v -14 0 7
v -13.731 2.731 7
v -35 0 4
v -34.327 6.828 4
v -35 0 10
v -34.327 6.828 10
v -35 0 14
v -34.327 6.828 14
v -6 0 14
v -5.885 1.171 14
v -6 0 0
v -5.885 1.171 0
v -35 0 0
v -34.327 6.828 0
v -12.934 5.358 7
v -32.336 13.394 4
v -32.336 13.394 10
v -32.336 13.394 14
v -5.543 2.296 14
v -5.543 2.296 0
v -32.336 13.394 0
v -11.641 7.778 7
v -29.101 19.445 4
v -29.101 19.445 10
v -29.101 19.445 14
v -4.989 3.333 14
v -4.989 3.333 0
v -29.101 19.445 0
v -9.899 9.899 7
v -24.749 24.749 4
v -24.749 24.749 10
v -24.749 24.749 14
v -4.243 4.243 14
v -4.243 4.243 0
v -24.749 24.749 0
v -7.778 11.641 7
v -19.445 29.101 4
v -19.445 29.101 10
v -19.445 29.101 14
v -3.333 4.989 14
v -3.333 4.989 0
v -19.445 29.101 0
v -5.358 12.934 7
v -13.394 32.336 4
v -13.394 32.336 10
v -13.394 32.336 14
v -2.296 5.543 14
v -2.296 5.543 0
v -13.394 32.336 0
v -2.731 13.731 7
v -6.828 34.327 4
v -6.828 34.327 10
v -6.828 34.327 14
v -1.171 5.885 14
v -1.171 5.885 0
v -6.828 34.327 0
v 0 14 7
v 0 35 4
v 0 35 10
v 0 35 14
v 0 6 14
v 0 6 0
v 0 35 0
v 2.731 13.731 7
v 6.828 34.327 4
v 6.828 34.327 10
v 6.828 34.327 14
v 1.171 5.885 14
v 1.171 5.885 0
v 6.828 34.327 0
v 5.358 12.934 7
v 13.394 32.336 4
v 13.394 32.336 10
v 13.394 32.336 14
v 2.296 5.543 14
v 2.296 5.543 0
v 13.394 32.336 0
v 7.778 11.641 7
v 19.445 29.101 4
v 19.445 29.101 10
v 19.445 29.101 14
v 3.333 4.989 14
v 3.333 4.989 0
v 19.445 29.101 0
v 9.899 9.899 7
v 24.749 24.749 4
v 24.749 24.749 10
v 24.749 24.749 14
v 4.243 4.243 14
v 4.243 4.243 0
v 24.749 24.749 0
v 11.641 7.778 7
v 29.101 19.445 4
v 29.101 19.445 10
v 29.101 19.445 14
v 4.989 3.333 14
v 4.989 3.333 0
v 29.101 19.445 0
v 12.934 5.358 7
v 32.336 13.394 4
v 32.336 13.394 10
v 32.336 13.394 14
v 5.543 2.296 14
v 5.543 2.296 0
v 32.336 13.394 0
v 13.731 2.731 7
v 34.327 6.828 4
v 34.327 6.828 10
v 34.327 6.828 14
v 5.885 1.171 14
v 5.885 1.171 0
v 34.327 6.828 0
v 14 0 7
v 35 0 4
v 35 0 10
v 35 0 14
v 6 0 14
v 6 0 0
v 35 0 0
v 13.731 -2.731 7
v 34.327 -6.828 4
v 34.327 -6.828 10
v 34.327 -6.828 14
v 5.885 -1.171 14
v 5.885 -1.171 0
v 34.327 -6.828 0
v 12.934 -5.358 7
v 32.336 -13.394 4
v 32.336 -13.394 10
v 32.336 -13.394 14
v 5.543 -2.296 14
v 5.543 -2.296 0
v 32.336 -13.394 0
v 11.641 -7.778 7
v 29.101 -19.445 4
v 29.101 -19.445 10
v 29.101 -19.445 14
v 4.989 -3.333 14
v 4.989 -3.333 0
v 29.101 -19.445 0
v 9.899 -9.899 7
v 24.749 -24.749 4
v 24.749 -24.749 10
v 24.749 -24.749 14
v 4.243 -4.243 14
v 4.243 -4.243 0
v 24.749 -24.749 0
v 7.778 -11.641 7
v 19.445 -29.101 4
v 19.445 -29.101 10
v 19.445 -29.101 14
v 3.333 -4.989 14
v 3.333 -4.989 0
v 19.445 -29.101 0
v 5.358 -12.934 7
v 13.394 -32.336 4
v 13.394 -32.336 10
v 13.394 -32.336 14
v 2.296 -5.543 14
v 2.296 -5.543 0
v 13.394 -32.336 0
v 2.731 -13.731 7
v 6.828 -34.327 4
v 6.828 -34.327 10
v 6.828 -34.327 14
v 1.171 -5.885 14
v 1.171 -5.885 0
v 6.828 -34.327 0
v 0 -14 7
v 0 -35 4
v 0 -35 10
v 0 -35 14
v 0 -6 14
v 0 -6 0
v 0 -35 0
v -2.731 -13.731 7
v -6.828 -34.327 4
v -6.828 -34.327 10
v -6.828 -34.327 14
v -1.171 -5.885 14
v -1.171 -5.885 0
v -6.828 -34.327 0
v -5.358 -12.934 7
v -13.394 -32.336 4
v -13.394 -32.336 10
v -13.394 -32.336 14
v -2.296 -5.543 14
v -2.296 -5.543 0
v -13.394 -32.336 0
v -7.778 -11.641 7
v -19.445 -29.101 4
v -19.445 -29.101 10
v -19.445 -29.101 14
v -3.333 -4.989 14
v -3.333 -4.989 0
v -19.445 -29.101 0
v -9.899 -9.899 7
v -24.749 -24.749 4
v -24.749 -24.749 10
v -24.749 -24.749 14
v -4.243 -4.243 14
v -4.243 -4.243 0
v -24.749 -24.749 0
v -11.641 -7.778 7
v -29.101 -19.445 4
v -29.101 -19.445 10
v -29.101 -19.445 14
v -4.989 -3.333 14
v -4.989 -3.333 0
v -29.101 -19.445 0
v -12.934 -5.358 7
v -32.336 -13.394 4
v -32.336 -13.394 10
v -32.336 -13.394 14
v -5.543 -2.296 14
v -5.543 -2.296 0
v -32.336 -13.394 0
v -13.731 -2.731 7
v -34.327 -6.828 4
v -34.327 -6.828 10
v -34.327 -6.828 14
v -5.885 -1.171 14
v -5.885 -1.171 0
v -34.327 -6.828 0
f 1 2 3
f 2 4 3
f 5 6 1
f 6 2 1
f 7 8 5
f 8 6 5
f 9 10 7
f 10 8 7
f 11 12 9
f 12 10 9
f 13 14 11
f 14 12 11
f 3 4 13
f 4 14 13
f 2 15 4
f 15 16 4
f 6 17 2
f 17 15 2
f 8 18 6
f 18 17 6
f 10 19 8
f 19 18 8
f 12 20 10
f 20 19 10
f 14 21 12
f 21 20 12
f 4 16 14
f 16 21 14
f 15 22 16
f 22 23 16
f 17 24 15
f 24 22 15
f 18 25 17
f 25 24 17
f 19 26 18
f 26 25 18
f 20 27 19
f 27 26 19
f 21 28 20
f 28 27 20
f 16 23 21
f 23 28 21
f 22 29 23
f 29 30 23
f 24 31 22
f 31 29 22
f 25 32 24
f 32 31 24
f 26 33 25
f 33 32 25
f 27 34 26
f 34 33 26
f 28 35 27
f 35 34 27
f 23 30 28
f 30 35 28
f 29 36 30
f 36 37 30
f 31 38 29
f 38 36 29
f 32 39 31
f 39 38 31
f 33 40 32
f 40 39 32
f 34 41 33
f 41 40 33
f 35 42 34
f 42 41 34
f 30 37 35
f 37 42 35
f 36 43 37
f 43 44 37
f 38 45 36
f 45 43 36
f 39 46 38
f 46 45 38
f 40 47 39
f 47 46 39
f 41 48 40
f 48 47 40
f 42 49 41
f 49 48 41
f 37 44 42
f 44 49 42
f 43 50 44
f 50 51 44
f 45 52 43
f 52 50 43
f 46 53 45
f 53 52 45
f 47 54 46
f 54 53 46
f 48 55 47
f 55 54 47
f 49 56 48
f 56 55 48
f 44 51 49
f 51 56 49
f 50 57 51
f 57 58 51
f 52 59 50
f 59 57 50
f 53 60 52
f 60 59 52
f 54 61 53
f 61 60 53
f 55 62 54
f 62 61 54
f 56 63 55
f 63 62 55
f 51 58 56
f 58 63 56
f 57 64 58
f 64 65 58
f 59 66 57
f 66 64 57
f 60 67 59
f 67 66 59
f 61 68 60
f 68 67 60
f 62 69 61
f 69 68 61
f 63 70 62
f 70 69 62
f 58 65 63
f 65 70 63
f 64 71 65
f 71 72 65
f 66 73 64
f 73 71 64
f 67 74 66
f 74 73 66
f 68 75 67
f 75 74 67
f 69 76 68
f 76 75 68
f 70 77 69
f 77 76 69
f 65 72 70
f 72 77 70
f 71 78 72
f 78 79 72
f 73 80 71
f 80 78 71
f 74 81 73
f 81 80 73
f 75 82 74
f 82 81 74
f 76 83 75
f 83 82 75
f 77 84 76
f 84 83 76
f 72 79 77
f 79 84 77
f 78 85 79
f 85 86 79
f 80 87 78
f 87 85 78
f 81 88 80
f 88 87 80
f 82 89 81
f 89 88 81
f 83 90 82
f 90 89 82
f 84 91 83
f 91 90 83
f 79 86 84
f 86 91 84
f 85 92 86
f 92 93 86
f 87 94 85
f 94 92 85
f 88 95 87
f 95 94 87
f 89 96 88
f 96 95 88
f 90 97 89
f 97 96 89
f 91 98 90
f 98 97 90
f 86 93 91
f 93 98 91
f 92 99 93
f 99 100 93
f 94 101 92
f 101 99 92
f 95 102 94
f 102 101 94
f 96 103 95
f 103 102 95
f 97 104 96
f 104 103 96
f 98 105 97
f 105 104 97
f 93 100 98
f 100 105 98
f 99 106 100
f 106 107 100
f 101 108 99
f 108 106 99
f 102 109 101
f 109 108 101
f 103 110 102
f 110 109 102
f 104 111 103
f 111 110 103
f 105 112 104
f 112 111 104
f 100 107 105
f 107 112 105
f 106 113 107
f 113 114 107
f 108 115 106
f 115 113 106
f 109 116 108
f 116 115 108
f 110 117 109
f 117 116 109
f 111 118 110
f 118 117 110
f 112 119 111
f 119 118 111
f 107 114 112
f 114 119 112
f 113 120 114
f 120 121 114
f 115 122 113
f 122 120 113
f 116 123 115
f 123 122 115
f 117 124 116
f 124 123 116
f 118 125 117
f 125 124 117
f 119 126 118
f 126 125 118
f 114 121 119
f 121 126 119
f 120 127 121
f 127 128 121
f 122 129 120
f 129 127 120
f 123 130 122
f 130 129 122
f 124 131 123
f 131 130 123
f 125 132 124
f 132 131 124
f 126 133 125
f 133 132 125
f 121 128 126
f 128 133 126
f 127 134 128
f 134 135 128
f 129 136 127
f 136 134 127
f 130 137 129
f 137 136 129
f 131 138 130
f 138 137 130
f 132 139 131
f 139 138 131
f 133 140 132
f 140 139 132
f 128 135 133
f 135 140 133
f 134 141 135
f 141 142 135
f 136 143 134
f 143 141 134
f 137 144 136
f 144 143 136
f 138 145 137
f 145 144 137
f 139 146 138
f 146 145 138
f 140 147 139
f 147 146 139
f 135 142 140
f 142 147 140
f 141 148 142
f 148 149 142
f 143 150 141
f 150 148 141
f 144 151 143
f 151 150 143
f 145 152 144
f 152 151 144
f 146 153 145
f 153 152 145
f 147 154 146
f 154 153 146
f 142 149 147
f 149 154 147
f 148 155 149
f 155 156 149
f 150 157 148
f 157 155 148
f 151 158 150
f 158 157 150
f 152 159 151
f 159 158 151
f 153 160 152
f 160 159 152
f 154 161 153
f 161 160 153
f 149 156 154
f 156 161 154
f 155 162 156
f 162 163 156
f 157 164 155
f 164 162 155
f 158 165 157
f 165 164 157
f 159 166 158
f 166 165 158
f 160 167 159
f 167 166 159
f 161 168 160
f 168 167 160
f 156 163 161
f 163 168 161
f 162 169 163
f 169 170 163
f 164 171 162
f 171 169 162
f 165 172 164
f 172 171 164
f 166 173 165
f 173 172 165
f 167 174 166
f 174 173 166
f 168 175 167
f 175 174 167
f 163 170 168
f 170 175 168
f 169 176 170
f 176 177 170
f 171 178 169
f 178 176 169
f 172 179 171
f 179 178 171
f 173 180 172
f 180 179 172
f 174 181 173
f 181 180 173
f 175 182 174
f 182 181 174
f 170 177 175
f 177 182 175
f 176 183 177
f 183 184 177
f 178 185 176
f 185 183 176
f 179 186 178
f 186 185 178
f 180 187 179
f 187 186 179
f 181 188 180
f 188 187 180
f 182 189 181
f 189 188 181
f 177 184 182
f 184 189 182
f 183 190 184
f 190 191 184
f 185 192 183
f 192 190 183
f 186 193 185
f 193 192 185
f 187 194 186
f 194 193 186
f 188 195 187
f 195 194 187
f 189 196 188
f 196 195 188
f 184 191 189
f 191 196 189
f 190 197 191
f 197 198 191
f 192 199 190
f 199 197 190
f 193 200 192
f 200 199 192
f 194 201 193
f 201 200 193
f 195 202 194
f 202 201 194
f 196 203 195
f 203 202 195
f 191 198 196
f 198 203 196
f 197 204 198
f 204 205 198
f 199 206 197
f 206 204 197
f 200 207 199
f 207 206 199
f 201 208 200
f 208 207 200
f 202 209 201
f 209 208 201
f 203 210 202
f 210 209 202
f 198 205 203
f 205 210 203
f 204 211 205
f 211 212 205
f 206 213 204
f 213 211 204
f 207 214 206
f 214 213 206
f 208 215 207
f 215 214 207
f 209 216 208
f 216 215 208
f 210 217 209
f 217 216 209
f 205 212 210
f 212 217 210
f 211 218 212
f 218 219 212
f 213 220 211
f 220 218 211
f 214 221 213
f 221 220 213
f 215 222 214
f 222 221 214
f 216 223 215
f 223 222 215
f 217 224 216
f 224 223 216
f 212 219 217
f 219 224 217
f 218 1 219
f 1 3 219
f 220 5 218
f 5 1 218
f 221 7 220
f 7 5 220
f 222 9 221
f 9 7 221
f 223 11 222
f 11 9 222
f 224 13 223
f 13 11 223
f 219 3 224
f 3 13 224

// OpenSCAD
$fn = 32;

// ----------------------------------------------------------------------
// Revolved part: V-groove pulley R35
// ----------------------------------------------------------------------

// --- parameters (mm) ---
bore_r = 6;               // bore radius
rim_r = 35;               // rim radius
rim_t = 14;               // rim width
groove_r = 14;            // groove root radius
groove_w = 3;             // groove half width
revolve_angle = 360;      // revolve sweep, degrees
fit_tol = 0.1;            // declared fit tolerance (prompt contract)
free_tol = 0.5;           // declared free tolerance (prompt contract)

bore_d = 2 * bore_r;
rim_d = 2 * rim_r;
groove_d = 2 * groove_r;

profile = [[6, 0], [35, 0], [35, 4], [14, 7], [35, 10], [35, 14], [6, 14]];  // primary outline, 7 points, counter clockwise

// --- the one profile operation ---
rotate_extrude(angle = revolve_angle) polygon(points = profile);
